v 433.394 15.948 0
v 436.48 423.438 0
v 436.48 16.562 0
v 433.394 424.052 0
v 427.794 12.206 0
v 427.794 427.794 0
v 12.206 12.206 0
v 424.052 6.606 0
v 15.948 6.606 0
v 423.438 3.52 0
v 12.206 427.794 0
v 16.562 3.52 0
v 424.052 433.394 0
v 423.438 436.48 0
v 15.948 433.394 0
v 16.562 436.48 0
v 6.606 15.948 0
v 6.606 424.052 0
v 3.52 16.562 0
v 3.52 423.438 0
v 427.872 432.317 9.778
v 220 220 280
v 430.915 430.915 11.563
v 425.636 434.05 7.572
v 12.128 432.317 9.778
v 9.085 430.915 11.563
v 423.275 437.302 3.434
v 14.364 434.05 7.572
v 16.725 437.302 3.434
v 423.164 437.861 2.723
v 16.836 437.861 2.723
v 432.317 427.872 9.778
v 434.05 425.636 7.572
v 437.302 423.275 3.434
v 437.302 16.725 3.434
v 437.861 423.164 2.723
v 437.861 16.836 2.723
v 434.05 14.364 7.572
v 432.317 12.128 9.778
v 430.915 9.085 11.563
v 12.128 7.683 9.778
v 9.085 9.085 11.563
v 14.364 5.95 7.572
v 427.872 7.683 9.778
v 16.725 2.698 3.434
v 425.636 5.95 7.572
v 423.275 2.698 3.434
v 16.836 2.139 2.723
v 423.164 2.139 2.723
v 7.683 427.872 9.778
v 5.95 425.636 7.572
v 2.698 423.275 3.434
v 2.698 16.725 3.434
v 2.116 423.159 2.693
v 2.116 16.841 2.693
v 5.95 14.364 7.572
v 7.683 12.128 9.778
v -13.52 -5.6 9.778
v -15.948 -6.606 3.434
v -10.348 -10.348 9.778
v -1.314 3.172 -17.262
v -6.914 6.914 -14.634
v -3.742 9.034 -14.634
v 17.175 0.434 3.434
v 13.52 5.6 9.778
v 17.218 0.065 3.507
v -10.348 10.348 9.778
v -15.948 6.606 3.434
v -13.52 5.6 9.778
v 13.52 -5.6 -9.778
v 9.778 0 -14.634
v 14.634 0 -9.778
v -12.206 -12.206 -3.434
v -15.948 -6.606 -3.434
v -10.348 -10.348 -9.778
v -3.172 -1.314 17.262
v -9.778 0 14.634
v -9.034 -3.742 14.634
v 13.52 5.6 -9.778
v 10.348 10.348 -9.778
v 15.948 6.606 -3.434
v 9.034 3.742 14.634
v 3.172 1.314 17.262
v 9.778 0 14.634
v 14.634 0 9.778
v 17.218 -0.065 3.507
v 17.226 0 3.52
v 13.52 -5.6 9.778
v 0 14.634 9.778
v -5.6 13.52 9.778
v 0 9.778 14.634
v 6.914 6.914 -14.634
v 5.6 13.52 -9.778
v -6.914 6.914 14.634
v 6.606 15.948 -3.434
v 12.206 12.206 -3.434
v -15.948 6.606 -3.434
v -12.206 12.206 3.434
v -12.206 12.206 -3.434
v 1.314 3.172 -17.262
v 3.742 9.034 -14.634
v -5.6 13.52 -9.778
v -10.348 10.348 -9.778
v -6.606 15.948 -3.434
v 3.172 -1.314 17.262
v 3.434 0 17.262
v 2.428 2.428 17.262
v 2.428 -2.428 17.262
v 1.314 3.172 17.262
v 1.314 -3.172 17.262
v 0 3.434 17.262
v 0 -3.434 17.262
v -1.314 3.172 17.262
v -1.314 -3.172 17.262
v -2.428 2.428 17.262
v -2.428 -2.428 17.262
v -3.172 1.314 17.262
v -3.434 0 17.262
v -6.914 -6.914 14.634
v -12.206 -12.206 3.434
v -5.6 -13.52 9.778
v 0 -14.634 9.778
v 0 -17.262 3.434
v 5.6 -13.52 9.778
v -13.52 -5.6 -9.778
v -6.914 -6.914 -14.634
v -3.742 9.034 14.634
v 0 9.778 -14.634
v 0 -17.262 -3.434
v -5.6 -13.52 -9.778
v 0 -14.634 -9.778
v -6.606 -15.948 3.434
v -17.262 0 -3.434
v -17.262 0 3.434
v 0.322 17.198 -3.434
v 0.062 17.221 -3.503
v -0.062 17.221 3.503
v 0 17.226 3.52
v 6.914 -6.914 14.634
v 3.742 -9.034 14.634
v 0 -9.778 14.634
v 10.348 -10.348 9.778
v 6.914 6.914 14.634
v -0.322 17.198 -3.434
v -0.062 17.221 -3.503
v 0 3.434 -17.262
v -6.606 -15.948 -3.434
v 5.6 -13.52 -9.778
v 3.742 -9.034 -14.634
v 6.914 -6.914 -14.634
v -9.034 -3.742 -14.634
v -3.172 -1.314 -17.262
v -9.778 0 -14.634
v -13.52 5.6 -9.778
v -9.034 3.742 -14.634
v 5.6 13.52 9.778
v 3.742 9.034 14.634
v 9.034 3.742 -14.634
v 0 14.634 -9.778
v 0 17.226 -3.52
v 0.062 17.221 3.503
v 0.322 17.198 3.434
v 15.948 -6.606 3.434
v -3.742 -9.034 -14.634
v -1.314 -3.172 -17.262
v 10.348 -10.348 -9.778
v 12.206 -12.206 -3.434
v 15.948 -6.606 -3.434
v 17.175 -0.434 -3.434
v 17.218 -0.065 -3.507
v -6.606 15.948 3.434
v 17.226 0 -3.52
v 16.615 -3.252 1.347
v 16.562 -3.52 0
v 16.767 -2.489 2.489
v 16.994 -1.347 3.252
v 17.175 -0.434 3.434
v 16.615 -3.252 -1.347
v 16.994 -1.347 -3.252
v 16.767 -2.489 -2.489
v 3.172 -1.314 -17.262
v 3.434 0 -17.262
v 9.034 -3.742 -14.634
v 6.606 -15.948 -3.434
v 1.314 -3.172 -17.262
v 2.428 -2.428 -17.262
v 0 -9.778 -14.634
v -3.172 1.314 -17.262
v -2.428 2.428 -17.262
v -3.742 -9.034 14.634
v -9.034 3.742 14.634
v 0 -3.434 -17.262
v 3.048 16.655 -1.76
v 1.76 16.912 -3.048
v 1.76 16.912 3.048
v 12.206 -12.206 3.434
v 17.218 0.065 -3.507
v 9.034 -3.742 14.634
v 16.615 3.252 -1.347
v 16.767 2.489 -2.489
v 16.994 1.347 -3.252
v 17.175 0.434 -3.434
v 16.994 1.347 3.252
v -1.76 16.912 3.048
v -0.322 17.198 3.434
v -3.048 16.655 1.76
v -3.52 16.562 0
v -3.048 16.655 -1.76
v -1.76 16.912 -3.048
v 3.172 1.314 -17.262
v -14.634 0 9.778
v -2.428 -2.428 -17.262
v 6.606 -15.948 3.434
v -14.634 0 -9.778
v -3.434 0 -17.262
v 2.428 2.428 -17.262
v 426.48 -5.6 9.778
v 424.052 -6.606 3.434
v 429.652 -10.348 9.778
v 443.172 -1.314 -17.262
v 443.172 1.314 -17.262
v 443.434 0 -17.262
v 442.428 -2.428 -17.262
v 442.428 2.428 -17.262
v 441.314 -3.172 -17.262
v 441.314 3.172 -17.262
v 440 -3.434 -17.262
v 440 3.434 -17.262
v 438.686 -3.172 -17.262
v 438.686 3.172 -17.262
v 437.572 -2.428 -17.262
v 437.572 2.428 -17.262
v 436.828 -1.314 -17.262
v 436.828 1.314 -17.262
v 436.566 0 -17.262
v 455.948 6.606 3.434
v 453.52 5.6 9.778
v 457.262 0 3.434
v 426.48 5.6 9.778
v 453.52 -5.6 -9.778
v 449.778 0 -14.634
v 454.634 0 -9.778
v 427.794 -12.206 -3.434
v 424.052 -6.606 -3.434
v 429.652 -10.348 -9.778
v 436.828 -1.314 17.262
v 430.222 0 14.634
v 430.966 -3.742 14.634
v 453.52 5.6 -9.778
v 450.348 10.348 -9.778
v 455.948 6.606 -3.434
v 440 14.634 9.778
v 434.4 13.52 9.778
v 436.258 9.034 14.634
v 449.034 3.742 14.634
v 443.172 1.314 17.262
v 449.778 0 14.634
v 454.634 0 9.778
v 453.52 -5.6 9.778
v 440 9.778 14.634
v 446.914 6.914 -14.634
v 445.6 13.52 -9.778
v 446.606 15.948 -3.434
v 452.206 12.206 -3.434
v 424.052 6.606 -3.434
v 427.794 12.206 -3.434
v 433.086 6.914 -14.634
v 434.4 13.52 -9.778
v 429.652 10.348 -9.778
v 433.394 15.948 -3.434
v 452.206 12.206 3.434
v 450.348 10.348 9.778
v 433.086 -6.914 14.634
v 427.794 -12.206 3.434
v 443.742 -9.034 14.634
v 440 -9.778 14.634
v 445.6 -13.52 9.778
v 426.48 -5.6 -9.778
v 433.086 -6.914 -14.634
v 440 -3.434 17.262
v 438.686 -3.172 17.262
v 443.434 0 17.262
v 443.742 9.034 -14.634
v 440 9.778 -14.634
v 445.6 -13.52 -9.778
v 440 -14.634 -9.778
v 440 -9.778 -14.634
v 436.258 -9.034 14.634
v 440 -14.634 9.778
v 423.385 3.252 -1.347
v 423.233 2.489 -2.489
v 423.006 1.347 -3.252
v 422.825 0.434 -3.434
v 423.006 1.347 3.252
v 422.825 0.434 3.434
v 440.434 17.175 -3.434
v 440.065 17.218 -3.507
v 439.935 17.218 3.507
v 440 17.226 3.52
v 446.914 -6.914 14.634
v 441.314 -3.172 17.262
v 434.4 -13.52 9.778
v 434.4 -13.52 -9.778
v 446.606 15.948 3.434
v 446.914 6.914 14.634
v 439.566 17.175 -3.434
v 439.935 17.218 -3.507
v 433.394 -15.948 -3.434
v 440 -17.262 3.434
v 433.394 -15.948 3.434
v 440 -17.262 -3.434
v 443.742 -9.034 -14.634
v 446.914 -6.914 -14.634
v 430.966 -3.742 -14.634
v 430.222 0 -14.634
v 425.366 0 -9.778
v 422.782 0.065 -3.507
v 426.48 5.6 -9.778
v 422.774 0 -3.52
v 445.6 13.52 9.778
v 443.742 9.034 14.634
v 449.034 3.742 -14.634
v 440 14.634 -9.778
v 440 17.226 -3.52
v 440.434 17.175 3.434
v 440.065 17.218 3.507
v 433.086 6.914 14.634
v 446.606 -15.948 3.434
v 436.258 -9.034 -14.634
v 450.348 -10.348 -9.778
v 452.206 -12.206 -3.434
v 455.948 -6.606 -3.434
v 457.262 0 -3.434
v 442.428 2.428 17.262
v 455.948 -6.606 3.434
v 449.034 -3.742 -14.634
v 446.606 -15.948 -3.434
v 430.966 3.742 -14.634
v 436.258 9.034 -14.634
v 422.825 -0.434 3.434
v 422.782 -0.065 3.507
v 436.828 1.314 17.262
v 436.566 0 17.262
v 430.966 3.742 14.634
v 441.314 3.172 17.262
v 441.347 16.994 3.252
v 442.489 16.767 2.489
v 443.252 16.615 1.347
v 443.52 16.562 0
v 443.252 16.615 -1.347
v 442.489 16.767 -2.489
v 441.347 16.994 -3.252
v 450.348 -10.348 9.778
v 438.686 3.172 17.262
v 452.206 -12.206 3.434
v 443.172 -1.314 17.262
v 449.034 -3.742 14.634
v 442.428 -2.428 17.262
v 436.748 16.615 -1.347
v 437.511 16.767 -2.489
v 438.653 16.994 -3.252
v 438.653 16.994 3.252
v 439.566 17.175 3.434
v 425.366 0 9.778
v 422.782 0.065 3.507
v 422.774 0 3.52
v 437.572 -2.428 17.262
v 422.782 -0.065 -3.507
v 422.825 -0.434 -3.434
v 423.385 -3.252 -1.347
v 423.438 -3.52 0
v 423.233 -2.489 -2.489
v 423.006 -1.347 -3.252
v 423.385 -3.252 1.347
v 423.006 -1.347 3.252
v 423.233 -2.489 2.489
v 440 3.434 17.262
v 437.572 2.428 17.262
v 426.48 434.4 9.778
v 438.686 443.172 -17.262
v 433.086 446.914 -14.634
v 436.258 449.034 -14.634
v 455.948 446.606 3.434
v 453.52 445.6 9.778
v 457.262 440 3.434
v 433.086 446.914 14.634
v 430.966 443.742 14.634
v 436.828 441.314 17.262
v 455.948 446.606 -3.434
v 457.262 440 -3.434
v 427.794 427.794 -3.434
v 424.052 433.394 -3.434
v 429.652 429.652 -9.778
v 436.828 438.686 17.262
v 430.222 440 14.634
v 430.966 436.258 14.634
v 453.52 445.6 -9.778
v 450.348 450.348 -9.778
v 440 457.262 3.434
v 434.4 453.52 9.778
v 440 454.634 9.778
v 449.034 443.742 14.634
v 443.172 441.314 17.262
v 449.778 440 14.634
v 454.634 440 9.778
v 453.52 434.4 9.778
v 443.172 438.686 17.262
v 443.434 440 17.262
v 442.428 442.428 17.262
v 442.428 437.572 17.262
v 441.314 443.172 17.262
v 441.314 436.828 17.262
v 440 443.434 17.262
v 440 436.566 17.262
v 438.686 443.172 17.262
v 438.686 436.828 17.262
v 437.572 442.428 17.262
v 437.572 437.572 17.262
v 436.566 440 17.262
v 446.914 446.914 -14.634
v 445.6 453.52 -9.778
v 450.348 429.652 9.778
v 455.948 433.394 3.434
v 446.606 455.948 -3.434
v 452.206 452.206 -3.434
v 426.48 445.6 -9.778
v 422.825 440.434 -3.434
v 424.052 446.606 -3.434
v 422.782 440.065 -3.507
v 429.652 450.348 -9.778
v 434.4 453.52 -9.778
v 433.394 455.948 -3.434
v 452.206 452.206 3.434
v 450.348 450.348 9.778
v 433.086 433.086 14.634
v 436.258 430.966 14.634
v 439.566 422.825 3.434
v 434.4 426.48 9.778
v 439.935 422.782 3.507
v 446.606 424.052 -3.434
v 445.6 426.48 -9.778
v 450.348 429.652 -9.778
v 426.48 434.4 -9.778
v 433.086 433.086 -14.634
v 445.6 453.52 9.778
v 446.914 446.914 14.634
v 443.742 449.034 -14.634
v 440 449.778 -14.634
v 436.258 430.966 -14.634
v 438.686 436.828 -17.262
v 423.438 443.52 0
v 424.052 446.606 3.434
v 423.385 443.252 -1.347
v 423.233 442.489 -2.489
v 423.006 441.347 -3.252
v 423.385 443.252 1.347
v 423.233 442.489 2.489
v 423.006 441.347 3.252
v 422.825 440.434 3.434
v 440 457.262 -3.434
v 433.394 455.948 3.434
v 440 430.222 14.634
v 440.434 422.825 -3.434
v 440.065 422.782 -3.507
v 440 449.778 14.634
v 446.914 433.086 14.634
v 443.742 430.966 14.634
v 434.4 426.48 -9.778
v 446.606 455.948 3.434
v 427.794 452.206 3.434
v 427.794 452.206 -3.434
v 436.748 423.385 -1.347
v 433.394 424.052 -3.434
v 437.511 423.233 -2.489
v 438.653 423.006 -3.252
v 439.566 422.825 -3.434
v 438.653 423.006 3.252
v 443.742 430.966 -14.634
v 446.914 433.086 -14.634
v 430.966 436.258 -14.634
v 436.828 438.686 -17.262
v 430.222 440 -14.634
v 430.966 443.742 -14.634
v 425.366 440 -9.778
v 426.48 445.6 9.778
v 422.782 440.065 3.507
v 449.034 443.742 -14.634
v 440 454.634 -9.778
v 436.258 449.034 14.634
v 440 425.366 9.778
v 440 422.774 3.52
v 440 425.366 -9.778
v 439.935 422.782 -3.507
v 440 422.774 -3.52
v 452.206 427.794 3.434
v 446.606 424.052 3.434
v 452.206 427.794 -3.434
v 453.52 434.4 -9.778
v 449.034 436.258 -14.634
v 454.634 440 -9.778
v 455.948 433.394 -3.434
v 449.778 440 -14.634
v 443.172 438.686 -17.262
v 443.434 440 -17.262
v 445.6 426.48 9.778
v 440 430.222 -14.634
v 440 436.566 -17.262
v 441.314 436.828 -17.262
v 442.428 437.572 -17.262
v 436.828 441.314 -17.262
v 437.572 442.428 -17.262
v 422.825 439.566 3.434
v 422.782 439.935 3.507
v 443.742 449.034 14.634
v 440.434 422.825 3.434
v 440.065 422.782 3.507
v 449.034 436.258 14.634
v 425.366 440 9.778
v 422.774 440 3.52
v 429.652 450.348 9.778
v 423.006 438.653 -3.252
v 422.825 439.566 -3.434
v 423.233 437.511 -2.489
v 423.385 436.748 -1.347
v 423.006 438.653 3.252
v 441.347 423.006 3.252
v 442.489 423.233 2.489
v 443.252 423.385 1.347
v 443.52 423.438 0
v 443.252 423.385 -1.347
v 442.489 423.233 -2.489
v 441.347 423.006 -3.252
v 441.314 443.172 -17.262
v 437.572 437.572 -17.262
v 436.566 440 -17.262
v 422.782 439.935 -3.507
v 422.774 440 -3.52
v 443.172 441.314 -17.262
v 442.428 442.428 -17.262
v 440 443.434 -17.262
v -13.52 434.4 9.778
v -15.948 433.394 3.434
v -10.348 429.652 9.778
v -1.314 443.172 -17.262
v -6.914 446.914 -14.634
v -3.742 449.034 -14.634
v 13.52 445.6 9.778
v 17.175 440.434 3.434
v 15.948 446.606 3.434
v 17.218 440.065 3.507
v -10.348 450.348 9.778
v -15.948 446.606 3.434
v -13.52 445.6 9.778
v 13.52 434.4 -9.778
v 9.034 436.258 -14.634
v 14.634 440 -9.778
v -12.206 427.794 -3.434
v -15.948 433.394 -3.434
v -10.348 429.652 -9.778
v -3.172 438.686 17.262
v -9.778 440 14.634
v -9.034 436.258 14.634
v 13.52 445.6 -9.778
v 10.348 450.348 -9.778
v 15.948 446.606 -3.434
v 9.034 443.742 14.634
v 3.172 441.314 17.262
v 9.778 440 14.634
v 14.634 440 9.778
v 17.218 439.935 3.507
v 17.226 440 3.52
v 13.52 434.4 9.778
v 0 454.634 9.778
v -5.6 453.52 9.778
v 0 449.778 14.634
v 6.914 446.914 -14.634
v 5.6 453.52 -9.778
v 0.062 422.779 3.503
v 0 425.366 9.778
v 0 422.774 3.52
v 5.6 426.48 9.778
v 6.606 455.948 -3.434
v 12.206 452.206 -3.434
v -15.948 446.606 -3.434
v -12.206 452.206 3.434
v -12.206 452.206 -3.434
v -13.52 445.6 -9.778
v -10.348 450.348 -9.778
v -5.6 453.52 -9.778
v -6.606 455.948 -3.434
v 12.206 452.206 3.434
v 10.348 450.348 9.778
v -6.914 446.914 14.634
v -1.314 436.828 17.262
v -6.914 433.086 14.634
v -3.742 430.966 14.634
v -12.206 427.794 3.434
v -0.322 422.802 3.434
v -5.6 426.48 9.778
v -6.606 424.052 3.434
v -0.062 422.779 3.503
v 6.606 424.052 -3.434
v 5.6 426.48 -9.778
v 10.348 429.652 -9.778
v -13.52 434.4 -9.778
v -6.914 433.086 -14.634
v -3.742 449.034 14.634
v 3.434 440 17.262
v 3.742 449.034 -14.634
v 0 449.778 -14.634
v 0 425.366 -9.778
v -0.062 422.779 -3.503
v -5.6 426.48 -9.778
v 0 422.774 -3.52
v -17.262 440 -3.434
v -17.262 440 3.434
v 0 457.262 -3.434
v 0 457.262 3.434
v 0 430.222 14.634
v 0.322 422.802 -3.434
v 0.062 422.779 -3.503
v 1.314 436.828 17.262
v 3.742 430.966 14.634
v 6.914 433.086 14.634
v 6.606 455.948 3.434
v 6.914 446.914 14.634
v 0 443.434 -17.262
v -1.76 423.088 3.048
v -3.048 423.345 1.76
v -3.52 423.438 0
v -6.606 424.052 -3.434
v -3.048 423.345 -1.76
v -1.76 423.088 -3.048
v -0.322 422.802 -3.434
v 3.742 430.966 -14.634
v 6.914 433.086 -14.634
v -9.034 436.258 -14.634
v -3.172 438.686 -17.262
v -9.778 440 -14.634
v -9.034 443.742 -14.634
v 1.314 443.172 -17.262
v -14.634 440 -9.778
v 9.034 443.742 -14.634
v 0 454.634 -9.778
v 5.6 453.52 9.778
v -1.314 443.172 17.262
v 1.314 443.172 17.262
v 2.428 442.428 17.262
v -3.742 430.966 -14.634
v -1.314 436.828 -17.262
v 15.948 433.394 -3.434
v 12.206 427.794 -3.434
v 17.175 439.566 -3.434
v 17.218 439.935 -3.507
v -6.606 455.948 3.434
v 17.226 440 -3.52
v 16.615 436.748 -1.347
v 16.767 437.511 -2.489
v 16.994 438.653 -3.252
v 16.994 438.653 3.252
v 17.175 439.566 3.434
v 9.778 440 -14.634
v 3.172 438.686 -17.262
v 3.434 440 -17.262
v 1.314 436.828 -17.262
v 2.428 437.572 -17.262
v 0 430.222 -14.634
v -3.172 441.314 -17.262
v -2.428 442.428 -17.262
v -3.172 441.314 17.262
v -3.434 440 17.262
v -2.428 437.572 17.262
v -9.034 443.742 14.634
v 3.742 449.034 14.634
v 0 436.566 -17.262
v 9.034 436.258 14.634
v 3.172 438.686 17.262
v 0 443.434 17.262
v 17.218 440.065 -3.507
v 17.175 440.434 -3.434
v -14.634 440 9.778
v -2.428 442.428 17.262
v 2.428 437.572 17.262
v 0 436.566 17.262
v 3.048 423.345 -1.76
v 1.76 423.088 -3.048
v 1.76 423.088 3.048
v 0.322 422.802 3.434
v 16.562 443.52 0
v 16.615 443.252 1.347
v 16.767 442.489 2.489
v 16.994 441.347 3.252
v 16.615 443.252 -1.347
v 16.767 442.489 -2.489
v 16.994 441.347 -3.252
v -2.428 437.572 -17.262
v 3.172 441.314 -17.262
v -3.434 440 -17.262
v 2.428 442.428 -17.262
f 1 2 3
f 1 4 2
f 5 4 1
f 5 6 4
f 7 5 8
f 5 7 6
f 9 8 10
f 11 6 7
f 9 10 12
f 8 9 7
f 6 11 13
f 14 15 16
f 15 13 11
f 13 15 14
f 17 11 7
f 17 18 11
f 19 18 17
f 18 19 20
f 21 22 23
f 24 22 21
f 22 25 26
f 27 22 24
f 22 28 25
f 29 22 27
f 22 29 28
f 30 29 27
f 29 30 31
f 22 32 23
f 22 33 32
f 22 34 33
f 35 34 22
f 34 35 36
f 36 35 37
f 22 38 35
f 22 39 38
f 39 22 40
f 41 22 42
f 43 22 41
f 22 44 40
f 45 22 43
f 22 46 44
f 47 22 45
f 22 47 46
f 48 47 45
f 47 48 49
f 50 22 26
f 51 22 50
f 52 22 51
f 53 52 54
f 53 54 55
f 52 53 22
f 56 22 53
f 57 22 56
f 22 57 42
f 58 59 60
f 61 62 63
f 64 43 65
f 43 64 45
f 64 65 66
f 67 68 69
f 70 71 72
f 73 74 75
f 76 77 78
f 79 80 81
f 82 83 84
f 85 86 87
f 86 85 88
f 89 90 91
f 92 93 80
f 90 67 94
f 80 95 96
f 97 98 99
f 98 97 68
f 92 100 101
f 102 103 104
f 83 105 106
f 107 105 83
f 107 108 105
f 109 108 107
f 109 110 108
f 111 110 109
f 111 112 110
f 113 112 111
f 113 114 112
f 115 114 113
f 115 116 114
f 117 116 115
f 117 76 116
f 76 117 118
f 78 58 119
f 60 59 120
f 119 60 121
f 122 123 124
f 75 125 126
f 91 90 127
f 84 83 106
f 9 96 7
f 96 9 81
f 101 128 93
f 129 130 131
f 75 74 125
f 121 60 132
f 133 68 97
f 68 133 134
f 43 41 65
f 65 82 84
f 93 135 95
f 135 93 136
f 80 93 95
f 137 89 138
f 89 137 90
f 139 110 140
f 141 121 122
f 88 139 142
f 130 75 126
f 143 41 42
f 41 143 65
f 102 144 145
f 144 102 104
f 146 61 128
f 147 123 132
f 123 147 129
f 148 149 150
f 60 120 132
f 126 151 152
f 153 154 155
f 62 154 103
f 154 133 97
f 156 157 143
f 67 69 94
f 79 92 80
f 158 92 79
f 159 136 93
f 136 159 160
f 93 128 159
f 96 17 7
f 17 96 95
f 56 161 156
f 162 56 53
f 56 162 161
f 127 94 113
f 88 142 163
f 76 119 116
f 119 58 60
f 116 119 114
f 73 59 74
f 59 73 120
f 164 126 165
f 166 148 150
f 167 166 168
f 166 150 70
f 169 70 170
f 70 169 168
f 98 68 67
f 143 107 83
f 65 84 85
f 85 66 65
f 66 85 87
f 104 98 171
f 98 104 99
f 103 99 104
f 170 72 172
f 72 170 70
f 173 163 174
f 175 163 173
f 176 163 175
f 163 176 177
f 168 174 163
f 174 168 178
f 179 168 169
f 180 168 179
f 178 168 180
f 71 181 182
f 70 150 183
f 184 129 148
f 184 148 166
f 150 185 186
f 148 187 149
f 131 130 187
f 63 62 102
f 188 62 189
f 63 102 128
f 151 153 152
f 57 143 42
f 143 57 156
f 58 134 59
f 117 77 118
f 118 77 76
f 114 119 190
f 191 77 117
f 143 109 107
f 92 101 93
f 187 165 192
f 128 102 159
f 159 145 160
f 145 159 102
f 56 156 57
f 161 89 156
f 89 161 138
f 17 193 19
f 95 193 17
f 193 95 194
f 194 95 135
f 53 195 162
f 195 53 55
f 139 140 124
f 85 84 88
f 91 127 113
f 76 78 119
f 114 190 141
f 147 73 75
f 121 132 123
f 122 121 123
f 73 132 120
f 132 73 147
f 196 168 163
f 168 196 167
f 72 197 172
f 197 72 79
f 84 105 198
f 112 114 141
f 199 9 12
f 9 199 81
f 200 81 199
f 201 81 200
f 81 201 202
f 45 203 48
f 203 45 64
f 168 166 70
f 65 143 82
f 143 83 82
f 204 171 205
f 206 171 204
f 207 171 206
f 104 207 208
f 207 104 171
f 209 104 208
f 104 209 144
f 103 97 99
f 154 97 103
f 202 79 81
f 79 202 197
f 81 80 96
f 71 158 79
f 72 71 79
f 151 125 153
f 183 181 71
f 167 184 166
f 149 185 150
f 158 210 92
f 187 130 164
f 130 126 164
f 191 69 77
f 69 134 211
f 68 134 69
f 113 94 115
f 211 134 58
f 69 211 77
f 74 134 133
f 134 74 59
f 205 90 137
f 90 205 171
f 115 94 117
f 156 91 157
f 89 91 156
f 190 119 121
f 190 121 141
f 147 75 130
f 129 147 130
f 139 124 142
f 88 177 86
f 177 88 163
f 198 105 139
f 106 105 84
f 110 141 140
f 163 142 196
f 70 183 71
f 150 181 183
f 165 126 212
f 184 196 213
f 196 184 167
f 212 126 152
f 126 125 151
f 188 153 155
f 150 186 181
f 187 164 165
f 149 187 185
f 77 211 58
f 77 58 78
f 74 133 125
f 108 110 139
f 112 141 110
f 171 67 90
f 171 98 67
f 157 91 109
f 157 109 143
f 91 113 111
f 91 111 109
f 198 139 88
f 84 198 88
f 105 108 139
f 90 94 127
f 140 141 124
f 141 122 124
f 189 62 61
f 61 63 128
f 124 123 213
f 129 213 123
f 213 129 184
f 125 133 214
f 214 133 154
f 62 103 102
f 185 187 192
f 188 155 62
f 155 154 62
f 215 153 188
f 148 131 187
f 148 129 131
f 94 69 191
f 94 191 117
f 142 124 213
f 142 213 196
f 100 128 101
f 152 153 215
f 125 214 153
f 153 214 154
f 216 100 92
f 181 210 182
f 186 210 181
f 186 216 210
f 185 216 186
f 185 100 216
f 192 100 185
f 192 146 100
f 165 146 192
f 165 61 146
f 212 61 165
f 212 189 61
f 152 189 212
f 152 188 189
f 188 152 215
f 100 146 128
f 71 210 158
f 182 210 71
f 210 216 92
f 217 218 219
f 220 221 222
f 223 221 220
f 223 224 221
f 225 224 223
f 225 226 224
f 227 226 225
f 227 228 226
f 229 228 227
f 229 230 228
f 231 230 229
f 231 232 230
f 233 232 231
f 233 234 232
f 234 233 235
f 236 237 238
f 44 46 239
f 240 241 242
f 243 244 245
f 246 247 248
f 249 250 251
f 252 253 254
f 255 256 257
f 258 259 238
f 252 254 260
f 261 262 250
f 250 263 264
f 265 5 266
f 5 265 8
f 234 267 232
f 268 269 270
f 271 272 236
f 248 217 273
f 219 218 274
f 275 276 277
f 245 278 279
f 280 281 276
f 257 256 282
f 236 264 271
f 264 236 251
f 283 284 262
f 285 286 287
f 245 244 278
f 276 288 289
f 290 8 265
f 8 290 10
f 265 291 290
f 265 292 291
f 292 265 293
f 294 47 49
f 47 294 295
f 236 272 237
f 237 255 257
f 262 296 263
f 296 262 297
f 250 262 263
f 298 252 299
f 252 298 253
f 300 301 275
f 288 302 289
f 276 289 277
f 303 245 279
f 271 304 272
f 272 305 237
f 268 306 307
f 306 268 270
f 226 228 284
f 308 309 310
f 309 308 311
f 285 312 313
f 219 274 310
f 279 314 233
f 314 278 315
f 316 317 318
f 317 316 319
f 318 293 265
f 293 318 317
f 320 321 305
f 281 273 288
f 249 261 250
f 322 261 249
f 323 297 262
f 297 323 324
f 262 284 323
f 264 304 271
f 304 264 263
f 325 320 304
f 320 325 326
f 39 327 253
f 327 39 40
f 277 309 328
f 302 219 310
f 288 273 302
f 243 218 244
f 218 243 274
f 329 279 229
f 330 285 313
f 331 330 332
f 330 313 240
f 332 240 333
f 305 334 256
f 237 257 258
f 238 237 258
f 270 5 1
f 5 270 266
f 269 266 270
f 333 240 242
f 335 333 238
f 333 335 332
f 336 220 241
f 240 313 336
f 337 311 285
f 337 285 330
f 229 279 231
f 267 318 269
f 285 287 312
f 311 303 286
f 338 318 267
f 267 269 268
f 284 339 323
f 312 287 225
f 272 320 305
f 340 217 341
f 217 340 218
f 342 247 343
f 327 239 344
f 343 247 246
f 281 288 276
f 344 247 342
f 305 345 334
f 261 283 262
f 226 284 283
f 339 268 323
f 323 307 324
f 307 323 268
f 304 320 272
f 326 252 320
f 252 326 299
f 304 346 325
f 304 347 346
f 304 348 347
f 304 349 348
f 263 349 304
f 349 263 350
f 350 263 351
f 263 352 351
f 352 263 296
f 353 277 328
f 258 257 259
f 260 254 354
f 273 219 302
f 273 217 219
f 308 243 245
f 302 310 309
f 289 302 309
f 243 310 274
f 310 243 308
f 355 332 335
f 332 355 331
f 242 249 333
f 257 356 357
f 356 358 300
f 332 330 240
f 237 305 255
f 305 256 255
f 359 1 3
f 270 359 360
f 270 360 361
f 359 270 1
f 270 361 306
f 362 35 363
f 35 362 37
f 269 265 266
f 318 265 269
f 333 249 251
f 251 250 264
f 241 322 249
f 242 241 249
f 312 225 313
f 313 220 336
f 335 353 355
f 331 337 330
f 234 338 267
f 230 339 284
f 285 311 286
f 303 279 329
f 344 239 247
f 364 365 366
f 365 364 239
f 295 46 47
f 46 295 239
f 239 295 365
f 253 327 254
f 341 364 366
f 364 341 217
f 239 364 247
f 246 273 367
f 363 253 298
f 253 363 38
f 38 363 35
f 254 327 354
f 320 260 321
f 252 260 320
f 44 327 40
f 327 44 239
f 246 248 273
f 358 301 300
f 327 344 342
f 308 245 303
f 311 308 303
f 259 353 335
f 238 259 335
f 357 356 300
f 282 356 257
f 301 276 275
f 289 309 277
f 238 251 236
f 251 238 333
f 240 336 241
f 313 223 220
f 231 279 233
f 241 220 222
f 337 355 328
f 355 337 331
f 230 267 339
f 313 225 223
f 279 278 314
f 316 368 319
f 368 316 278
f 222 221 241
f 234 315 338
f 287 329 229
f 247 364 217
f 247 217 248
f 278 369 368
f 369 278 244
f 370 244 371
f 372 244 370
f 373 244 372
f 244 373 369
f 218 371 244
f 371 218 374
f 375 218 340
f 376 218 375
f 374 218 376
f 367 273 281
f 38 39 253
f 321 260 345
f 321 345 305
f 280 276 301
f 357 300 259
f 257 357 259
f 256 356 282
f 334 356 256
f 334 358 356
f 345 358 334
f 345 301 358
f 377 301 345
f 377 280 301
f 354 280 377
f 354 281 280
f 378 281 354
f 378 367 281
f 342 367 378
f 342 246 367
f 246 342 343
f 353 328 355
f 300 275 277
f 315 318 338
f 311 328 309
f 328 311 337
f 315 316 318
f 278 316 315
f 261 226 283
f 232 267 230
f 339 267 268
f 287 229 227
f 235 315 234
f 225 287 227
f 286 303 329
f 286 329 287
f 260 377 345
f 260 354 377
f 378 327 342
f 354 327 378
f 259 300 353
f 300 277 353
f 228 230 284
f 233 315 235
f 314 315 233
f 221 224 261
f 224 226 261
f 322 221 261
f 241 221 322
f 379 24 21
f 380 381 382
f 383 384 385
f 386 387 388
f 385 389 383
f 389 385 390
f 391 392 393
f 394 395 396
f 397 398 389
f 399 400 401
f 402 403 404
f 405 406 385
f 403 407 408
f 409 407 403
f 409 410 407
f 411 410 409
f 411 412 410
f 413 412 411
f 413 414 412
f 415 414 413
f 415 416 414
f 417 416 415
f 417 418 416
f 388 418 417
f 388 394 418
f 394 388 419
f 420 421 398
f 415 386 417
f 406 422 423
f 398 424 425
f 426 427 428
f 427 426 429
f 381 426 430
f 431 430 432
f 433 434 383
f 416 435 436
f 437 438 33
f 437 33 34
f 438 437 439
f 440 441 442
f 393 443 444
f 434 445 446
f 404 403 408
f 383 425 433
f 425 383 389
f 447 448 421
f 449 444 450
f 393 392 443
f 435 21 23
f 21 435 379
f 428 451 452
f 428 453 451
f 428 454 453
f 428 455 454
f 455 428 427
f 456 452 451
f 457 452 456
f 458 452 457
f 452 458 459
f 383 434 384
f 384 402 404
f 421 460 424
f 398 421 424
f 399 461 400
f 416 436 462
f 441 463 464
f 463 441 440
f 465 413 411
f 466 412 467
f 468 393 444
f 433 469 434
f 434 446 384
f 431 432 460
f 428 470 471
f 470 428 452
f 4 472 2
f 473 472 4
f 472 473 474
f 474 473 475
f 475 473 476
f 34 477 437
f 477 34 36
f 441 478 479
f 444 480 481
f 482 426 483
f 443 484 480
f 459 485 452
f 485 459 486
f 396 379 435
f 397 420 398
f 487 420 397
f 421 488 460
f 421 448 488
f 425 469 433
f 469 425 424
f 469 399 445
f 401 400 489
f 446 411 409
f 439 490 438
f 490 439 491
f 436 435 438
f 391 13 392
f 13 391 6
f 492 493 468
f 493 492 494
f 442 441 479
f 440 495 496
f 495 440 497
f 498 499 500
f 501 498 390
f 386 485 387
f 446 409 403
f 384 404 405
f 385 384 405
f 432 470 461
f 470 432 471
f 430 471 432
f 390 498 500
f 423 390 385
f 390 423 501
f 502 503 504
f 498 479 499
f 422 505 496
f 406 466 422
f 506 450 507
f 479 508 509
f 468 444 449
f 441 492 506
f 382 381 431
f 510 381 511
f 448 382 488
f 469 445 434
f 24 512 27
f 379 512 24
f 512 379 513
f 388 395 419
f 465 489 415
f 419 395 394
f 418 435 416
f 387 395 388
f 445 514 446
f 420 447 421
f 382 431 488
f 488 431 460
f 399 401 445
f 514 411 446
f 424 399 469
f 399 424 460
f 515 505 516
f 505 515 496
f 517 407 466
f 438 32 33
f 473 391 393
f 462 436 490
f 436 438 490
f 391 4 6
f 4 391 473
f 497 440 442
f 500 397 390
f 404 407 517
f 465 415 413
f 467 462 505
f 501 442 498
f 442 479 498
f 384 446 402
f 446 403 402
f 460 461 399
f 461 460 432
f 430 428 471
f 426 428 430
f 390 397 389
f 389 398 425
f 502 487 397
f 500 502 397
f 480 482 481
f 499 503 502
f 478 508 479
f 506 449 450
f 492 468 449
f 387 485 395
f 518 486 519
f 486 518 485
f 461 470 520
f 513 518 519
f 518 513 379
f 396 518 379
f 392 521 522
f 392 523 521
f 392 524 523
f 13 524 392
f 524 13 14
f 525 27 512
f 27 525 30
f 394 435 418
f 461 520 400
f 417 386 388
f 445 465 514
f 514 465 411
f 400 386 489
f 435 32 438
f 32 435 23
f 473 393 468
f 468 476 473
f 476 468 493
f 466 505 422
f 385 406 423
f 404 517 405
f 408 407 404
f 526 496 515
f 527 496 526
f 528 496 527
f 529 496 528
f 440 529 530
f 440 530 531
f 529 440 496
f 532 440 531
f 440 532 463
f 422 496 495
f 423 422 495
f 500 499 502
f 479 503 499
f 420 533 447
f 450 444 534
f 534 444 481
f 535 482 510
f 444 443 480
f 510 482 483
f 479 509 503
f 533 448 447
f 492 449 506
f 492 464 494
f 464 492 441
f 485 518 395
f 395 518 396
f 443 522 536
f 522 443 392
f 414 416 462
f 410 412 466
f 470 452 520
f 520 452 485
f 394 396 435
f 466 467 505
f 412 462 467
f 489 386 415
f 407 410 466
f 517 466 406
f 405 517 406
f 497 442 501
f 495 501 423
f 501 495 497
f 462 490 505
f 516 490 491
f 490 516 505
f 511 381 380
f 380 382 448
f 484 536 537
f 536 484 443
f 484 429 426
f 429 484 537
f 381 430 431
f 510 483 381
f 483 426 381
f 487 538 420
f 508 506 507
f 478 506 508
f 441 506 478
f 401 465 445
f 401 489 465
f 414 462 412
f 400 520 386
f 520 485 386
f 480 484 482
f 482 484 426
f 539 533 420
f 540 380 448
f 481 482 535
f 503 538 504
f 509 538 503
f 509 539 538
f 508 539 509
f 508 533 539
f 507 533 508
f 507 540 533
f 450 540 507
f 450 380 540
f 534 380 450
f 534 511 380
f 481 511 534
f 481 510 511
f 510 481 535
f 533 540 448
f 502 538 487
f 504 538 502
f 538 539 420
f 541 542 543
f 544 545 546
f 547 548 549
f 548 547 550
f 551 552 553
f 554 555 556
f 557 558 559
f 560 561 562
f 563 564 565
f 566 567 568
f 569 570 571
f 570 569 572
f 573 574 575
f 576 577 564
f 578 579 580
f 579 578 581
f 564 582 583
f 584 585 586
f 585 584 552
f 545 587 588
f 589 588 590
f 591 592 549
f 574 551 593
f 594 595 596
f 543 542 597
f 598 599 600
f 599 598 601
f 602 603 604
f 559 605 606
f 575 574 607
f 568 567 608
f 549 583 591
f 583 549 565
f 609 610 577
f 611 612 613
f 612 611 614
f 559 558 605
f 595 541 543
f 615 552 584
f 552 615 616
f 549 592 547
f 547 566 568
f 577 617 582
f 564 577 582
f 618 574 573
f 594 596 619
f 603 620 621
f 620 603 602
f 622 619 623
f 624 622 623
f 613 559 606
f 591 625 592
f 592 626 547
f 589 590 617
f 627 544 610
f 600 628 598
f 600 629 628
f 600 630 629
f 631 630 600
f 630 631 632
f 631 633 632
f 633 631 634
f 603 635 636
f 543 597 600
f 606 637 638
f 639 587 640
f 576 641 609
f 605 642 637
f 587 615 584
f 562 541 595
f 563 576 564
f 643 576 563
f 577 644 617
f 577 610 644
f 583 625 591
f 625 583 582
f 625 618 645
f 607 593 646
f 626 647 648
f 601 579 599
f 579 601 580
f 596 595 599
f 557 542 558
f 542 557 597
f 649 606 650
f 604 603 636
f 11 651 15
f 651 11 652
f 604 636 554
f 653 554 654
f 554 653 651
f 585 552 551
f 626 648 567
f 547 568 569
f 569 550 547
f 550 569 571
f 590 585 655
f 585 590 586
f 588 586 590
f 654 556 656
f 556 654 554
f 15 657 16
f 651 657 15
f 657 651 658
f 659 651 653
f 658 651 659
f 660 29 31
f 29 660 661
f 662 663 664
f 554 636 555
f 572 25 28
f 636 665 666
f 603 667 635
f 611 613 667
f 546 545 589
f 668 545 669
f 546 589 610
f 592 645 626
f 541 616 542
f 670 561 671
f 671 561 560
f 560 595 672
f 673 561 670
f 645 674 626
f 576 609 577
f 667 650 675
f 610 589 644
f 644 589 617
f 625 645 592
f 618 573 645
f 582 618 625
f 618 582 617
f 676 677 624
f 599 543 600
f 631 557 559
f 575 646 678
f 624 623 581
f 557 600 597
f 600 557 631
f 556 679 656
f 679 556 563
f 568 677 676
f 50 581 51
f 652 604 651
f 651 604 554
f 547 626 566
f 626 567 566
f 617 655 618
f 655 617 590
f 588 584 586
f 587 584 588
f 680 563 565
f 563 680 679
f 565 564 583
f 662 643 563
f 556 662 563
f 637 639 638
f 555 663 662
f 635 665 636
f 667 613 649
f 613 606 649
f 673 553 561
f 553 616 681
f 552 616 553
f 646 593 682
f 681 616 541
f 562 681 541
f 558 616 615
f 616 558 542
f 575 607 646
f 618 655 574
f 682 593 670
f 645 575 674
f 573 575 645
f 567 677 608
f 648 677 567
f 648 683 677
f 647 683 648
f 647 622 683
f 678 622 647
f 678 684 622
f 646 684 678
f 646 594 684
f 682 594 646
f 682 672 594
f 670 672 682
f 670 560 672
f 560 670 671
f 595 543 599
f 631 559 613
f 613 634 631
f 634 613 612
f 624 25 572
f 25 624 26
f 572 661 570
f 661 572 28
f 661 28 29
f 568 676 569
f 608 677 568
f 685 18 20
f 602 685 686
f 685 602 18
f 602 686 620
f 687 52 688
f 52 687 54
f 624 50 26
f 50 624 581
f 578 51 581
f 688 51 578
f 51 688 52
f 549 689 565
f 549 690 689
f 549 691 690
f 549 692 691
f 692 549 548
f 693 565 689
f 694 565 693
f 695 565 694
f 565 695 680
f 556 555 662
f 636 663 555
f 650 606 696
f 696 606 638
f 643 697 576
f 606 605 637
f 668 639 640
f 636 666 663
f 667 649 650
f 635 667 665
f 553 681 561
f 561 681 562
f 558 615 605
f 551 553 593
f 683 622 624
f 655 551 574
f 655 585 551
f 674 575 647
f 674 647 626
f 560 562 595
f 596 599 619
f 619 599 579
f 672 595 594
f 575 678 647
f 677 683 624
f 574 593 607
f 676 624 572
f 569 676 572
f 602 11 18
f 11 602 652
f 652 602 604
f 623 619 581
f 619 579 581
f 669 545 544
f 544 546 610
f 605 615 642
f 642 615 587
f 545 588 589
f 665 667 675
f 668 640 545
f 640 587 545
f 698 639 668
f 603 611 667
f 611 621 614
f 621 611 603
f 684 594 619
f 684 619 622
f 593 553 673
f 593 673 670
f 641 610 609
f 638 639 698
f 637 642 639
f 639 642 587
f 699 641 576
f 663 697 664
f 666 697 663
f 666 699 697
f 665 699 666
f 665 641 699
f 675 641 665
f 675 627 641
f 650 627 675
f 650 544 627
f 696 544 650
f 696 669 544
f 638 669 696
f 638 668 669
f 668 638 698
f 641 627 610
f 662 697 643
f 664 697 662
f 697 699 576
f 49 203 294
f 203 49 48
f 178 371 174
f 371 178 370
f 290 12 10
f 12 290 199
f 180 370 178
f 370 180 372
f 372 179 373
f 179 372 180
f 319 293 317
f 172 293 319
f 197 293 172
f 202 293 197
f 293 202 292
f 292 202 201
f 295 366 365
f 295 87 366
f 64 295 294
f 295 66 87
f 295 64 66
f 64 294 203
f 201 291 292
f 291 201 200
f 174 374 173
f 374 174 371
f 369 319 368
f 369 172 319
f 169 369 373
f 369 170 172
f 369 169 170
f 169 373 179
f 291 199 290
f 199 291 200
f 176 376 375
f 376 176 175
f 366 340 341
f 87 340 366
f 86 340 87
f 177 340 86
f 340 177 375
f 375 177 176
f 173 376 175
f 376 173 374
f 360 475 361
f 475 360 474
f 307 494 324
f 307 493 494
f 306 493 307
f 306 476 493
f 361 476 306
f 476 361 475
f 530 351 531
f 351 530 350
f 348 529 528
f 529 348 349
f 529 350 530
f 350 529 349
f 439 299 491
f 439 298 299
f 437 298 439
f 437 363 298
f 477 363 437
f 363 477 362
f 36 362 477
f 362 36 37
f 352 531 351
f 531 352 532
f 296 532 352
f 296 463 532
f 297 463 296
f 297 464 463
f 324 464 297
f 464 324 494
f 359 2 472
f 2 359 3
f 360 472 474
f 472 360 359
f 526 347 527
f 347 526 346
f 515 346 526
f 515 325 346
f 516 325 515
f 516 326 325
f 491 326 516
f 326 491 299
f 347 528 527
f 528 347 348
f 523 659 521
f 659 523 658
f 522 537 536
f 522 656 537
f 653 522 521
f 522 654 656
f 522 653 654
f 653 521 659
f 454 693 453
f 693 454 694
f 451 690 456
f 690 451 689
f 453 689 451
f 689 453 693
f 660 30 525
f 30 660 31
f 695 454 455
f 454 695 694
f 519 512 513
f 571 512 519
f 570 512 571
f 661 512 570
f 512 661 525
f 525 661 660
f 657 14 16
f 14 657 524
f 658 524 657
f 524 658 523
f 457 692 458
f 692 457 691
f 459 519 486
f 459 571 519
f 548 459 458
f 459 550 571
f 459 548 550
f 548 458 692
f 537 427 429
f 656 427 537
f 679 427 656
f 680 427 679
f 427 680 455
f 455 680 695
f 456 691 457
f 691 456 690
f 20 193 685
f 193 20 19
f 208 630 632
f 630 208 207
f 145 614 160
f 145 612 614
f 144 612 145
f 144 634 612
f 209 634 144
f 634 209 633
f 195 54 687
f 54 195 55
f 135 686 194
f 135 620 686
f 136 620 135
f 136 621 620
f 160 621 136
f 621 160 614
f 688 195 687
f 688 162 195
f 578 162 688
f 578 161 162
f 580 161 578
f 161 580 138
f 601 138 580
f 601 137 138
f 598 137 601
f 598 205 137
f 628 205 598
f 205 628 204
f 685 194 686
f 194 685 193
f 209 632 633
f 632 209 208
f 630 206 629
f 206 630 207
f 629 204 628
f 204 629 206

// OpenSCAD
// Unit of length: Unit.ROYAL_CUBIT
union()
{
   polyhedron(points = [[0.0, 0.0, 0.0], [440.0, 0.0, 0.0], [440.0, 440.0, 0.0], [0.0, 440.0, 0.0], [220.0, 220.0, 280.0]], faces = [[0, 1, 2, 3], [0, 4, 1], [1, 4, 2], [2, 4, 3], [3, 4, 0]]);
   color(c = [1.0, 0.0, 0.0, 1.0])
   {
      translate(v = [0.0, 0.0, 0.0])
      {
         sphere(d = 35.2, $fn = 16);
      }
   }
   color(c = [1.0, 0.647, 0.0, 1.0])
   {
      translate(v = [440.0, 0.0, 0.0])
      {
         sphere(d = 35.2, $fn = 16);
      }
   }
   color(c = [0.0, 0.502, 0.0, 1.0])
   {
      translate(v = [440.0, 440.0, 0.0])
      {
         sphere(d = 35.2, $fn = 16);
      }
   }
   color(c = [0.0, 0.0, 0.0, 1.0])
   {
      translate(v = [0.0, 440.0, 0.0])
      {
         sphere(d = 35.2, $fn = 16);
      }
   }
   color(c = [0.0, 0.0, 0.0, 1.0])
   {
      translate(v = [0.0, 0.0, 0.0])
      {
         rotate(a = [0.0, 90.0, 0.0])
         {
            cylinder(h = 440.0, d = 7.04, center = false, $fn = 16);
         }
      }
   }
   color(c = [0.0, 0.0, 0.0, 1.0])
   {
      translate(v = [440.0, 0.0, 0.0])
      {
         rotate(a = [0.0, 90.0, 90.0])
         {
            cylinder(h = 440.0, d = 7.04, center = false, $fn = 16);
         }
      }
   }
   color(c = [0.0, 0.0, 0.0, 1.0])
   {
      translate(v = [440.0, 440.0, 0.0])
      {
         rotate(a = [0.0, 90.0, 180.0])
         {
            cylinder(h = 440.0, d = 7.04, center = false, $fn = 16);
         }
      }
   }
   color(c = [0.0, 0.0, 0.0, 1.0])
   {
      translate(v = [0.0, 440.0, 0.0])
      {
         rotate(a = [0.0, 90.0, -90.0])
         {
            cylinder(h = 440.0, d = 7.04, center = false);
         }
      }
   }
}
